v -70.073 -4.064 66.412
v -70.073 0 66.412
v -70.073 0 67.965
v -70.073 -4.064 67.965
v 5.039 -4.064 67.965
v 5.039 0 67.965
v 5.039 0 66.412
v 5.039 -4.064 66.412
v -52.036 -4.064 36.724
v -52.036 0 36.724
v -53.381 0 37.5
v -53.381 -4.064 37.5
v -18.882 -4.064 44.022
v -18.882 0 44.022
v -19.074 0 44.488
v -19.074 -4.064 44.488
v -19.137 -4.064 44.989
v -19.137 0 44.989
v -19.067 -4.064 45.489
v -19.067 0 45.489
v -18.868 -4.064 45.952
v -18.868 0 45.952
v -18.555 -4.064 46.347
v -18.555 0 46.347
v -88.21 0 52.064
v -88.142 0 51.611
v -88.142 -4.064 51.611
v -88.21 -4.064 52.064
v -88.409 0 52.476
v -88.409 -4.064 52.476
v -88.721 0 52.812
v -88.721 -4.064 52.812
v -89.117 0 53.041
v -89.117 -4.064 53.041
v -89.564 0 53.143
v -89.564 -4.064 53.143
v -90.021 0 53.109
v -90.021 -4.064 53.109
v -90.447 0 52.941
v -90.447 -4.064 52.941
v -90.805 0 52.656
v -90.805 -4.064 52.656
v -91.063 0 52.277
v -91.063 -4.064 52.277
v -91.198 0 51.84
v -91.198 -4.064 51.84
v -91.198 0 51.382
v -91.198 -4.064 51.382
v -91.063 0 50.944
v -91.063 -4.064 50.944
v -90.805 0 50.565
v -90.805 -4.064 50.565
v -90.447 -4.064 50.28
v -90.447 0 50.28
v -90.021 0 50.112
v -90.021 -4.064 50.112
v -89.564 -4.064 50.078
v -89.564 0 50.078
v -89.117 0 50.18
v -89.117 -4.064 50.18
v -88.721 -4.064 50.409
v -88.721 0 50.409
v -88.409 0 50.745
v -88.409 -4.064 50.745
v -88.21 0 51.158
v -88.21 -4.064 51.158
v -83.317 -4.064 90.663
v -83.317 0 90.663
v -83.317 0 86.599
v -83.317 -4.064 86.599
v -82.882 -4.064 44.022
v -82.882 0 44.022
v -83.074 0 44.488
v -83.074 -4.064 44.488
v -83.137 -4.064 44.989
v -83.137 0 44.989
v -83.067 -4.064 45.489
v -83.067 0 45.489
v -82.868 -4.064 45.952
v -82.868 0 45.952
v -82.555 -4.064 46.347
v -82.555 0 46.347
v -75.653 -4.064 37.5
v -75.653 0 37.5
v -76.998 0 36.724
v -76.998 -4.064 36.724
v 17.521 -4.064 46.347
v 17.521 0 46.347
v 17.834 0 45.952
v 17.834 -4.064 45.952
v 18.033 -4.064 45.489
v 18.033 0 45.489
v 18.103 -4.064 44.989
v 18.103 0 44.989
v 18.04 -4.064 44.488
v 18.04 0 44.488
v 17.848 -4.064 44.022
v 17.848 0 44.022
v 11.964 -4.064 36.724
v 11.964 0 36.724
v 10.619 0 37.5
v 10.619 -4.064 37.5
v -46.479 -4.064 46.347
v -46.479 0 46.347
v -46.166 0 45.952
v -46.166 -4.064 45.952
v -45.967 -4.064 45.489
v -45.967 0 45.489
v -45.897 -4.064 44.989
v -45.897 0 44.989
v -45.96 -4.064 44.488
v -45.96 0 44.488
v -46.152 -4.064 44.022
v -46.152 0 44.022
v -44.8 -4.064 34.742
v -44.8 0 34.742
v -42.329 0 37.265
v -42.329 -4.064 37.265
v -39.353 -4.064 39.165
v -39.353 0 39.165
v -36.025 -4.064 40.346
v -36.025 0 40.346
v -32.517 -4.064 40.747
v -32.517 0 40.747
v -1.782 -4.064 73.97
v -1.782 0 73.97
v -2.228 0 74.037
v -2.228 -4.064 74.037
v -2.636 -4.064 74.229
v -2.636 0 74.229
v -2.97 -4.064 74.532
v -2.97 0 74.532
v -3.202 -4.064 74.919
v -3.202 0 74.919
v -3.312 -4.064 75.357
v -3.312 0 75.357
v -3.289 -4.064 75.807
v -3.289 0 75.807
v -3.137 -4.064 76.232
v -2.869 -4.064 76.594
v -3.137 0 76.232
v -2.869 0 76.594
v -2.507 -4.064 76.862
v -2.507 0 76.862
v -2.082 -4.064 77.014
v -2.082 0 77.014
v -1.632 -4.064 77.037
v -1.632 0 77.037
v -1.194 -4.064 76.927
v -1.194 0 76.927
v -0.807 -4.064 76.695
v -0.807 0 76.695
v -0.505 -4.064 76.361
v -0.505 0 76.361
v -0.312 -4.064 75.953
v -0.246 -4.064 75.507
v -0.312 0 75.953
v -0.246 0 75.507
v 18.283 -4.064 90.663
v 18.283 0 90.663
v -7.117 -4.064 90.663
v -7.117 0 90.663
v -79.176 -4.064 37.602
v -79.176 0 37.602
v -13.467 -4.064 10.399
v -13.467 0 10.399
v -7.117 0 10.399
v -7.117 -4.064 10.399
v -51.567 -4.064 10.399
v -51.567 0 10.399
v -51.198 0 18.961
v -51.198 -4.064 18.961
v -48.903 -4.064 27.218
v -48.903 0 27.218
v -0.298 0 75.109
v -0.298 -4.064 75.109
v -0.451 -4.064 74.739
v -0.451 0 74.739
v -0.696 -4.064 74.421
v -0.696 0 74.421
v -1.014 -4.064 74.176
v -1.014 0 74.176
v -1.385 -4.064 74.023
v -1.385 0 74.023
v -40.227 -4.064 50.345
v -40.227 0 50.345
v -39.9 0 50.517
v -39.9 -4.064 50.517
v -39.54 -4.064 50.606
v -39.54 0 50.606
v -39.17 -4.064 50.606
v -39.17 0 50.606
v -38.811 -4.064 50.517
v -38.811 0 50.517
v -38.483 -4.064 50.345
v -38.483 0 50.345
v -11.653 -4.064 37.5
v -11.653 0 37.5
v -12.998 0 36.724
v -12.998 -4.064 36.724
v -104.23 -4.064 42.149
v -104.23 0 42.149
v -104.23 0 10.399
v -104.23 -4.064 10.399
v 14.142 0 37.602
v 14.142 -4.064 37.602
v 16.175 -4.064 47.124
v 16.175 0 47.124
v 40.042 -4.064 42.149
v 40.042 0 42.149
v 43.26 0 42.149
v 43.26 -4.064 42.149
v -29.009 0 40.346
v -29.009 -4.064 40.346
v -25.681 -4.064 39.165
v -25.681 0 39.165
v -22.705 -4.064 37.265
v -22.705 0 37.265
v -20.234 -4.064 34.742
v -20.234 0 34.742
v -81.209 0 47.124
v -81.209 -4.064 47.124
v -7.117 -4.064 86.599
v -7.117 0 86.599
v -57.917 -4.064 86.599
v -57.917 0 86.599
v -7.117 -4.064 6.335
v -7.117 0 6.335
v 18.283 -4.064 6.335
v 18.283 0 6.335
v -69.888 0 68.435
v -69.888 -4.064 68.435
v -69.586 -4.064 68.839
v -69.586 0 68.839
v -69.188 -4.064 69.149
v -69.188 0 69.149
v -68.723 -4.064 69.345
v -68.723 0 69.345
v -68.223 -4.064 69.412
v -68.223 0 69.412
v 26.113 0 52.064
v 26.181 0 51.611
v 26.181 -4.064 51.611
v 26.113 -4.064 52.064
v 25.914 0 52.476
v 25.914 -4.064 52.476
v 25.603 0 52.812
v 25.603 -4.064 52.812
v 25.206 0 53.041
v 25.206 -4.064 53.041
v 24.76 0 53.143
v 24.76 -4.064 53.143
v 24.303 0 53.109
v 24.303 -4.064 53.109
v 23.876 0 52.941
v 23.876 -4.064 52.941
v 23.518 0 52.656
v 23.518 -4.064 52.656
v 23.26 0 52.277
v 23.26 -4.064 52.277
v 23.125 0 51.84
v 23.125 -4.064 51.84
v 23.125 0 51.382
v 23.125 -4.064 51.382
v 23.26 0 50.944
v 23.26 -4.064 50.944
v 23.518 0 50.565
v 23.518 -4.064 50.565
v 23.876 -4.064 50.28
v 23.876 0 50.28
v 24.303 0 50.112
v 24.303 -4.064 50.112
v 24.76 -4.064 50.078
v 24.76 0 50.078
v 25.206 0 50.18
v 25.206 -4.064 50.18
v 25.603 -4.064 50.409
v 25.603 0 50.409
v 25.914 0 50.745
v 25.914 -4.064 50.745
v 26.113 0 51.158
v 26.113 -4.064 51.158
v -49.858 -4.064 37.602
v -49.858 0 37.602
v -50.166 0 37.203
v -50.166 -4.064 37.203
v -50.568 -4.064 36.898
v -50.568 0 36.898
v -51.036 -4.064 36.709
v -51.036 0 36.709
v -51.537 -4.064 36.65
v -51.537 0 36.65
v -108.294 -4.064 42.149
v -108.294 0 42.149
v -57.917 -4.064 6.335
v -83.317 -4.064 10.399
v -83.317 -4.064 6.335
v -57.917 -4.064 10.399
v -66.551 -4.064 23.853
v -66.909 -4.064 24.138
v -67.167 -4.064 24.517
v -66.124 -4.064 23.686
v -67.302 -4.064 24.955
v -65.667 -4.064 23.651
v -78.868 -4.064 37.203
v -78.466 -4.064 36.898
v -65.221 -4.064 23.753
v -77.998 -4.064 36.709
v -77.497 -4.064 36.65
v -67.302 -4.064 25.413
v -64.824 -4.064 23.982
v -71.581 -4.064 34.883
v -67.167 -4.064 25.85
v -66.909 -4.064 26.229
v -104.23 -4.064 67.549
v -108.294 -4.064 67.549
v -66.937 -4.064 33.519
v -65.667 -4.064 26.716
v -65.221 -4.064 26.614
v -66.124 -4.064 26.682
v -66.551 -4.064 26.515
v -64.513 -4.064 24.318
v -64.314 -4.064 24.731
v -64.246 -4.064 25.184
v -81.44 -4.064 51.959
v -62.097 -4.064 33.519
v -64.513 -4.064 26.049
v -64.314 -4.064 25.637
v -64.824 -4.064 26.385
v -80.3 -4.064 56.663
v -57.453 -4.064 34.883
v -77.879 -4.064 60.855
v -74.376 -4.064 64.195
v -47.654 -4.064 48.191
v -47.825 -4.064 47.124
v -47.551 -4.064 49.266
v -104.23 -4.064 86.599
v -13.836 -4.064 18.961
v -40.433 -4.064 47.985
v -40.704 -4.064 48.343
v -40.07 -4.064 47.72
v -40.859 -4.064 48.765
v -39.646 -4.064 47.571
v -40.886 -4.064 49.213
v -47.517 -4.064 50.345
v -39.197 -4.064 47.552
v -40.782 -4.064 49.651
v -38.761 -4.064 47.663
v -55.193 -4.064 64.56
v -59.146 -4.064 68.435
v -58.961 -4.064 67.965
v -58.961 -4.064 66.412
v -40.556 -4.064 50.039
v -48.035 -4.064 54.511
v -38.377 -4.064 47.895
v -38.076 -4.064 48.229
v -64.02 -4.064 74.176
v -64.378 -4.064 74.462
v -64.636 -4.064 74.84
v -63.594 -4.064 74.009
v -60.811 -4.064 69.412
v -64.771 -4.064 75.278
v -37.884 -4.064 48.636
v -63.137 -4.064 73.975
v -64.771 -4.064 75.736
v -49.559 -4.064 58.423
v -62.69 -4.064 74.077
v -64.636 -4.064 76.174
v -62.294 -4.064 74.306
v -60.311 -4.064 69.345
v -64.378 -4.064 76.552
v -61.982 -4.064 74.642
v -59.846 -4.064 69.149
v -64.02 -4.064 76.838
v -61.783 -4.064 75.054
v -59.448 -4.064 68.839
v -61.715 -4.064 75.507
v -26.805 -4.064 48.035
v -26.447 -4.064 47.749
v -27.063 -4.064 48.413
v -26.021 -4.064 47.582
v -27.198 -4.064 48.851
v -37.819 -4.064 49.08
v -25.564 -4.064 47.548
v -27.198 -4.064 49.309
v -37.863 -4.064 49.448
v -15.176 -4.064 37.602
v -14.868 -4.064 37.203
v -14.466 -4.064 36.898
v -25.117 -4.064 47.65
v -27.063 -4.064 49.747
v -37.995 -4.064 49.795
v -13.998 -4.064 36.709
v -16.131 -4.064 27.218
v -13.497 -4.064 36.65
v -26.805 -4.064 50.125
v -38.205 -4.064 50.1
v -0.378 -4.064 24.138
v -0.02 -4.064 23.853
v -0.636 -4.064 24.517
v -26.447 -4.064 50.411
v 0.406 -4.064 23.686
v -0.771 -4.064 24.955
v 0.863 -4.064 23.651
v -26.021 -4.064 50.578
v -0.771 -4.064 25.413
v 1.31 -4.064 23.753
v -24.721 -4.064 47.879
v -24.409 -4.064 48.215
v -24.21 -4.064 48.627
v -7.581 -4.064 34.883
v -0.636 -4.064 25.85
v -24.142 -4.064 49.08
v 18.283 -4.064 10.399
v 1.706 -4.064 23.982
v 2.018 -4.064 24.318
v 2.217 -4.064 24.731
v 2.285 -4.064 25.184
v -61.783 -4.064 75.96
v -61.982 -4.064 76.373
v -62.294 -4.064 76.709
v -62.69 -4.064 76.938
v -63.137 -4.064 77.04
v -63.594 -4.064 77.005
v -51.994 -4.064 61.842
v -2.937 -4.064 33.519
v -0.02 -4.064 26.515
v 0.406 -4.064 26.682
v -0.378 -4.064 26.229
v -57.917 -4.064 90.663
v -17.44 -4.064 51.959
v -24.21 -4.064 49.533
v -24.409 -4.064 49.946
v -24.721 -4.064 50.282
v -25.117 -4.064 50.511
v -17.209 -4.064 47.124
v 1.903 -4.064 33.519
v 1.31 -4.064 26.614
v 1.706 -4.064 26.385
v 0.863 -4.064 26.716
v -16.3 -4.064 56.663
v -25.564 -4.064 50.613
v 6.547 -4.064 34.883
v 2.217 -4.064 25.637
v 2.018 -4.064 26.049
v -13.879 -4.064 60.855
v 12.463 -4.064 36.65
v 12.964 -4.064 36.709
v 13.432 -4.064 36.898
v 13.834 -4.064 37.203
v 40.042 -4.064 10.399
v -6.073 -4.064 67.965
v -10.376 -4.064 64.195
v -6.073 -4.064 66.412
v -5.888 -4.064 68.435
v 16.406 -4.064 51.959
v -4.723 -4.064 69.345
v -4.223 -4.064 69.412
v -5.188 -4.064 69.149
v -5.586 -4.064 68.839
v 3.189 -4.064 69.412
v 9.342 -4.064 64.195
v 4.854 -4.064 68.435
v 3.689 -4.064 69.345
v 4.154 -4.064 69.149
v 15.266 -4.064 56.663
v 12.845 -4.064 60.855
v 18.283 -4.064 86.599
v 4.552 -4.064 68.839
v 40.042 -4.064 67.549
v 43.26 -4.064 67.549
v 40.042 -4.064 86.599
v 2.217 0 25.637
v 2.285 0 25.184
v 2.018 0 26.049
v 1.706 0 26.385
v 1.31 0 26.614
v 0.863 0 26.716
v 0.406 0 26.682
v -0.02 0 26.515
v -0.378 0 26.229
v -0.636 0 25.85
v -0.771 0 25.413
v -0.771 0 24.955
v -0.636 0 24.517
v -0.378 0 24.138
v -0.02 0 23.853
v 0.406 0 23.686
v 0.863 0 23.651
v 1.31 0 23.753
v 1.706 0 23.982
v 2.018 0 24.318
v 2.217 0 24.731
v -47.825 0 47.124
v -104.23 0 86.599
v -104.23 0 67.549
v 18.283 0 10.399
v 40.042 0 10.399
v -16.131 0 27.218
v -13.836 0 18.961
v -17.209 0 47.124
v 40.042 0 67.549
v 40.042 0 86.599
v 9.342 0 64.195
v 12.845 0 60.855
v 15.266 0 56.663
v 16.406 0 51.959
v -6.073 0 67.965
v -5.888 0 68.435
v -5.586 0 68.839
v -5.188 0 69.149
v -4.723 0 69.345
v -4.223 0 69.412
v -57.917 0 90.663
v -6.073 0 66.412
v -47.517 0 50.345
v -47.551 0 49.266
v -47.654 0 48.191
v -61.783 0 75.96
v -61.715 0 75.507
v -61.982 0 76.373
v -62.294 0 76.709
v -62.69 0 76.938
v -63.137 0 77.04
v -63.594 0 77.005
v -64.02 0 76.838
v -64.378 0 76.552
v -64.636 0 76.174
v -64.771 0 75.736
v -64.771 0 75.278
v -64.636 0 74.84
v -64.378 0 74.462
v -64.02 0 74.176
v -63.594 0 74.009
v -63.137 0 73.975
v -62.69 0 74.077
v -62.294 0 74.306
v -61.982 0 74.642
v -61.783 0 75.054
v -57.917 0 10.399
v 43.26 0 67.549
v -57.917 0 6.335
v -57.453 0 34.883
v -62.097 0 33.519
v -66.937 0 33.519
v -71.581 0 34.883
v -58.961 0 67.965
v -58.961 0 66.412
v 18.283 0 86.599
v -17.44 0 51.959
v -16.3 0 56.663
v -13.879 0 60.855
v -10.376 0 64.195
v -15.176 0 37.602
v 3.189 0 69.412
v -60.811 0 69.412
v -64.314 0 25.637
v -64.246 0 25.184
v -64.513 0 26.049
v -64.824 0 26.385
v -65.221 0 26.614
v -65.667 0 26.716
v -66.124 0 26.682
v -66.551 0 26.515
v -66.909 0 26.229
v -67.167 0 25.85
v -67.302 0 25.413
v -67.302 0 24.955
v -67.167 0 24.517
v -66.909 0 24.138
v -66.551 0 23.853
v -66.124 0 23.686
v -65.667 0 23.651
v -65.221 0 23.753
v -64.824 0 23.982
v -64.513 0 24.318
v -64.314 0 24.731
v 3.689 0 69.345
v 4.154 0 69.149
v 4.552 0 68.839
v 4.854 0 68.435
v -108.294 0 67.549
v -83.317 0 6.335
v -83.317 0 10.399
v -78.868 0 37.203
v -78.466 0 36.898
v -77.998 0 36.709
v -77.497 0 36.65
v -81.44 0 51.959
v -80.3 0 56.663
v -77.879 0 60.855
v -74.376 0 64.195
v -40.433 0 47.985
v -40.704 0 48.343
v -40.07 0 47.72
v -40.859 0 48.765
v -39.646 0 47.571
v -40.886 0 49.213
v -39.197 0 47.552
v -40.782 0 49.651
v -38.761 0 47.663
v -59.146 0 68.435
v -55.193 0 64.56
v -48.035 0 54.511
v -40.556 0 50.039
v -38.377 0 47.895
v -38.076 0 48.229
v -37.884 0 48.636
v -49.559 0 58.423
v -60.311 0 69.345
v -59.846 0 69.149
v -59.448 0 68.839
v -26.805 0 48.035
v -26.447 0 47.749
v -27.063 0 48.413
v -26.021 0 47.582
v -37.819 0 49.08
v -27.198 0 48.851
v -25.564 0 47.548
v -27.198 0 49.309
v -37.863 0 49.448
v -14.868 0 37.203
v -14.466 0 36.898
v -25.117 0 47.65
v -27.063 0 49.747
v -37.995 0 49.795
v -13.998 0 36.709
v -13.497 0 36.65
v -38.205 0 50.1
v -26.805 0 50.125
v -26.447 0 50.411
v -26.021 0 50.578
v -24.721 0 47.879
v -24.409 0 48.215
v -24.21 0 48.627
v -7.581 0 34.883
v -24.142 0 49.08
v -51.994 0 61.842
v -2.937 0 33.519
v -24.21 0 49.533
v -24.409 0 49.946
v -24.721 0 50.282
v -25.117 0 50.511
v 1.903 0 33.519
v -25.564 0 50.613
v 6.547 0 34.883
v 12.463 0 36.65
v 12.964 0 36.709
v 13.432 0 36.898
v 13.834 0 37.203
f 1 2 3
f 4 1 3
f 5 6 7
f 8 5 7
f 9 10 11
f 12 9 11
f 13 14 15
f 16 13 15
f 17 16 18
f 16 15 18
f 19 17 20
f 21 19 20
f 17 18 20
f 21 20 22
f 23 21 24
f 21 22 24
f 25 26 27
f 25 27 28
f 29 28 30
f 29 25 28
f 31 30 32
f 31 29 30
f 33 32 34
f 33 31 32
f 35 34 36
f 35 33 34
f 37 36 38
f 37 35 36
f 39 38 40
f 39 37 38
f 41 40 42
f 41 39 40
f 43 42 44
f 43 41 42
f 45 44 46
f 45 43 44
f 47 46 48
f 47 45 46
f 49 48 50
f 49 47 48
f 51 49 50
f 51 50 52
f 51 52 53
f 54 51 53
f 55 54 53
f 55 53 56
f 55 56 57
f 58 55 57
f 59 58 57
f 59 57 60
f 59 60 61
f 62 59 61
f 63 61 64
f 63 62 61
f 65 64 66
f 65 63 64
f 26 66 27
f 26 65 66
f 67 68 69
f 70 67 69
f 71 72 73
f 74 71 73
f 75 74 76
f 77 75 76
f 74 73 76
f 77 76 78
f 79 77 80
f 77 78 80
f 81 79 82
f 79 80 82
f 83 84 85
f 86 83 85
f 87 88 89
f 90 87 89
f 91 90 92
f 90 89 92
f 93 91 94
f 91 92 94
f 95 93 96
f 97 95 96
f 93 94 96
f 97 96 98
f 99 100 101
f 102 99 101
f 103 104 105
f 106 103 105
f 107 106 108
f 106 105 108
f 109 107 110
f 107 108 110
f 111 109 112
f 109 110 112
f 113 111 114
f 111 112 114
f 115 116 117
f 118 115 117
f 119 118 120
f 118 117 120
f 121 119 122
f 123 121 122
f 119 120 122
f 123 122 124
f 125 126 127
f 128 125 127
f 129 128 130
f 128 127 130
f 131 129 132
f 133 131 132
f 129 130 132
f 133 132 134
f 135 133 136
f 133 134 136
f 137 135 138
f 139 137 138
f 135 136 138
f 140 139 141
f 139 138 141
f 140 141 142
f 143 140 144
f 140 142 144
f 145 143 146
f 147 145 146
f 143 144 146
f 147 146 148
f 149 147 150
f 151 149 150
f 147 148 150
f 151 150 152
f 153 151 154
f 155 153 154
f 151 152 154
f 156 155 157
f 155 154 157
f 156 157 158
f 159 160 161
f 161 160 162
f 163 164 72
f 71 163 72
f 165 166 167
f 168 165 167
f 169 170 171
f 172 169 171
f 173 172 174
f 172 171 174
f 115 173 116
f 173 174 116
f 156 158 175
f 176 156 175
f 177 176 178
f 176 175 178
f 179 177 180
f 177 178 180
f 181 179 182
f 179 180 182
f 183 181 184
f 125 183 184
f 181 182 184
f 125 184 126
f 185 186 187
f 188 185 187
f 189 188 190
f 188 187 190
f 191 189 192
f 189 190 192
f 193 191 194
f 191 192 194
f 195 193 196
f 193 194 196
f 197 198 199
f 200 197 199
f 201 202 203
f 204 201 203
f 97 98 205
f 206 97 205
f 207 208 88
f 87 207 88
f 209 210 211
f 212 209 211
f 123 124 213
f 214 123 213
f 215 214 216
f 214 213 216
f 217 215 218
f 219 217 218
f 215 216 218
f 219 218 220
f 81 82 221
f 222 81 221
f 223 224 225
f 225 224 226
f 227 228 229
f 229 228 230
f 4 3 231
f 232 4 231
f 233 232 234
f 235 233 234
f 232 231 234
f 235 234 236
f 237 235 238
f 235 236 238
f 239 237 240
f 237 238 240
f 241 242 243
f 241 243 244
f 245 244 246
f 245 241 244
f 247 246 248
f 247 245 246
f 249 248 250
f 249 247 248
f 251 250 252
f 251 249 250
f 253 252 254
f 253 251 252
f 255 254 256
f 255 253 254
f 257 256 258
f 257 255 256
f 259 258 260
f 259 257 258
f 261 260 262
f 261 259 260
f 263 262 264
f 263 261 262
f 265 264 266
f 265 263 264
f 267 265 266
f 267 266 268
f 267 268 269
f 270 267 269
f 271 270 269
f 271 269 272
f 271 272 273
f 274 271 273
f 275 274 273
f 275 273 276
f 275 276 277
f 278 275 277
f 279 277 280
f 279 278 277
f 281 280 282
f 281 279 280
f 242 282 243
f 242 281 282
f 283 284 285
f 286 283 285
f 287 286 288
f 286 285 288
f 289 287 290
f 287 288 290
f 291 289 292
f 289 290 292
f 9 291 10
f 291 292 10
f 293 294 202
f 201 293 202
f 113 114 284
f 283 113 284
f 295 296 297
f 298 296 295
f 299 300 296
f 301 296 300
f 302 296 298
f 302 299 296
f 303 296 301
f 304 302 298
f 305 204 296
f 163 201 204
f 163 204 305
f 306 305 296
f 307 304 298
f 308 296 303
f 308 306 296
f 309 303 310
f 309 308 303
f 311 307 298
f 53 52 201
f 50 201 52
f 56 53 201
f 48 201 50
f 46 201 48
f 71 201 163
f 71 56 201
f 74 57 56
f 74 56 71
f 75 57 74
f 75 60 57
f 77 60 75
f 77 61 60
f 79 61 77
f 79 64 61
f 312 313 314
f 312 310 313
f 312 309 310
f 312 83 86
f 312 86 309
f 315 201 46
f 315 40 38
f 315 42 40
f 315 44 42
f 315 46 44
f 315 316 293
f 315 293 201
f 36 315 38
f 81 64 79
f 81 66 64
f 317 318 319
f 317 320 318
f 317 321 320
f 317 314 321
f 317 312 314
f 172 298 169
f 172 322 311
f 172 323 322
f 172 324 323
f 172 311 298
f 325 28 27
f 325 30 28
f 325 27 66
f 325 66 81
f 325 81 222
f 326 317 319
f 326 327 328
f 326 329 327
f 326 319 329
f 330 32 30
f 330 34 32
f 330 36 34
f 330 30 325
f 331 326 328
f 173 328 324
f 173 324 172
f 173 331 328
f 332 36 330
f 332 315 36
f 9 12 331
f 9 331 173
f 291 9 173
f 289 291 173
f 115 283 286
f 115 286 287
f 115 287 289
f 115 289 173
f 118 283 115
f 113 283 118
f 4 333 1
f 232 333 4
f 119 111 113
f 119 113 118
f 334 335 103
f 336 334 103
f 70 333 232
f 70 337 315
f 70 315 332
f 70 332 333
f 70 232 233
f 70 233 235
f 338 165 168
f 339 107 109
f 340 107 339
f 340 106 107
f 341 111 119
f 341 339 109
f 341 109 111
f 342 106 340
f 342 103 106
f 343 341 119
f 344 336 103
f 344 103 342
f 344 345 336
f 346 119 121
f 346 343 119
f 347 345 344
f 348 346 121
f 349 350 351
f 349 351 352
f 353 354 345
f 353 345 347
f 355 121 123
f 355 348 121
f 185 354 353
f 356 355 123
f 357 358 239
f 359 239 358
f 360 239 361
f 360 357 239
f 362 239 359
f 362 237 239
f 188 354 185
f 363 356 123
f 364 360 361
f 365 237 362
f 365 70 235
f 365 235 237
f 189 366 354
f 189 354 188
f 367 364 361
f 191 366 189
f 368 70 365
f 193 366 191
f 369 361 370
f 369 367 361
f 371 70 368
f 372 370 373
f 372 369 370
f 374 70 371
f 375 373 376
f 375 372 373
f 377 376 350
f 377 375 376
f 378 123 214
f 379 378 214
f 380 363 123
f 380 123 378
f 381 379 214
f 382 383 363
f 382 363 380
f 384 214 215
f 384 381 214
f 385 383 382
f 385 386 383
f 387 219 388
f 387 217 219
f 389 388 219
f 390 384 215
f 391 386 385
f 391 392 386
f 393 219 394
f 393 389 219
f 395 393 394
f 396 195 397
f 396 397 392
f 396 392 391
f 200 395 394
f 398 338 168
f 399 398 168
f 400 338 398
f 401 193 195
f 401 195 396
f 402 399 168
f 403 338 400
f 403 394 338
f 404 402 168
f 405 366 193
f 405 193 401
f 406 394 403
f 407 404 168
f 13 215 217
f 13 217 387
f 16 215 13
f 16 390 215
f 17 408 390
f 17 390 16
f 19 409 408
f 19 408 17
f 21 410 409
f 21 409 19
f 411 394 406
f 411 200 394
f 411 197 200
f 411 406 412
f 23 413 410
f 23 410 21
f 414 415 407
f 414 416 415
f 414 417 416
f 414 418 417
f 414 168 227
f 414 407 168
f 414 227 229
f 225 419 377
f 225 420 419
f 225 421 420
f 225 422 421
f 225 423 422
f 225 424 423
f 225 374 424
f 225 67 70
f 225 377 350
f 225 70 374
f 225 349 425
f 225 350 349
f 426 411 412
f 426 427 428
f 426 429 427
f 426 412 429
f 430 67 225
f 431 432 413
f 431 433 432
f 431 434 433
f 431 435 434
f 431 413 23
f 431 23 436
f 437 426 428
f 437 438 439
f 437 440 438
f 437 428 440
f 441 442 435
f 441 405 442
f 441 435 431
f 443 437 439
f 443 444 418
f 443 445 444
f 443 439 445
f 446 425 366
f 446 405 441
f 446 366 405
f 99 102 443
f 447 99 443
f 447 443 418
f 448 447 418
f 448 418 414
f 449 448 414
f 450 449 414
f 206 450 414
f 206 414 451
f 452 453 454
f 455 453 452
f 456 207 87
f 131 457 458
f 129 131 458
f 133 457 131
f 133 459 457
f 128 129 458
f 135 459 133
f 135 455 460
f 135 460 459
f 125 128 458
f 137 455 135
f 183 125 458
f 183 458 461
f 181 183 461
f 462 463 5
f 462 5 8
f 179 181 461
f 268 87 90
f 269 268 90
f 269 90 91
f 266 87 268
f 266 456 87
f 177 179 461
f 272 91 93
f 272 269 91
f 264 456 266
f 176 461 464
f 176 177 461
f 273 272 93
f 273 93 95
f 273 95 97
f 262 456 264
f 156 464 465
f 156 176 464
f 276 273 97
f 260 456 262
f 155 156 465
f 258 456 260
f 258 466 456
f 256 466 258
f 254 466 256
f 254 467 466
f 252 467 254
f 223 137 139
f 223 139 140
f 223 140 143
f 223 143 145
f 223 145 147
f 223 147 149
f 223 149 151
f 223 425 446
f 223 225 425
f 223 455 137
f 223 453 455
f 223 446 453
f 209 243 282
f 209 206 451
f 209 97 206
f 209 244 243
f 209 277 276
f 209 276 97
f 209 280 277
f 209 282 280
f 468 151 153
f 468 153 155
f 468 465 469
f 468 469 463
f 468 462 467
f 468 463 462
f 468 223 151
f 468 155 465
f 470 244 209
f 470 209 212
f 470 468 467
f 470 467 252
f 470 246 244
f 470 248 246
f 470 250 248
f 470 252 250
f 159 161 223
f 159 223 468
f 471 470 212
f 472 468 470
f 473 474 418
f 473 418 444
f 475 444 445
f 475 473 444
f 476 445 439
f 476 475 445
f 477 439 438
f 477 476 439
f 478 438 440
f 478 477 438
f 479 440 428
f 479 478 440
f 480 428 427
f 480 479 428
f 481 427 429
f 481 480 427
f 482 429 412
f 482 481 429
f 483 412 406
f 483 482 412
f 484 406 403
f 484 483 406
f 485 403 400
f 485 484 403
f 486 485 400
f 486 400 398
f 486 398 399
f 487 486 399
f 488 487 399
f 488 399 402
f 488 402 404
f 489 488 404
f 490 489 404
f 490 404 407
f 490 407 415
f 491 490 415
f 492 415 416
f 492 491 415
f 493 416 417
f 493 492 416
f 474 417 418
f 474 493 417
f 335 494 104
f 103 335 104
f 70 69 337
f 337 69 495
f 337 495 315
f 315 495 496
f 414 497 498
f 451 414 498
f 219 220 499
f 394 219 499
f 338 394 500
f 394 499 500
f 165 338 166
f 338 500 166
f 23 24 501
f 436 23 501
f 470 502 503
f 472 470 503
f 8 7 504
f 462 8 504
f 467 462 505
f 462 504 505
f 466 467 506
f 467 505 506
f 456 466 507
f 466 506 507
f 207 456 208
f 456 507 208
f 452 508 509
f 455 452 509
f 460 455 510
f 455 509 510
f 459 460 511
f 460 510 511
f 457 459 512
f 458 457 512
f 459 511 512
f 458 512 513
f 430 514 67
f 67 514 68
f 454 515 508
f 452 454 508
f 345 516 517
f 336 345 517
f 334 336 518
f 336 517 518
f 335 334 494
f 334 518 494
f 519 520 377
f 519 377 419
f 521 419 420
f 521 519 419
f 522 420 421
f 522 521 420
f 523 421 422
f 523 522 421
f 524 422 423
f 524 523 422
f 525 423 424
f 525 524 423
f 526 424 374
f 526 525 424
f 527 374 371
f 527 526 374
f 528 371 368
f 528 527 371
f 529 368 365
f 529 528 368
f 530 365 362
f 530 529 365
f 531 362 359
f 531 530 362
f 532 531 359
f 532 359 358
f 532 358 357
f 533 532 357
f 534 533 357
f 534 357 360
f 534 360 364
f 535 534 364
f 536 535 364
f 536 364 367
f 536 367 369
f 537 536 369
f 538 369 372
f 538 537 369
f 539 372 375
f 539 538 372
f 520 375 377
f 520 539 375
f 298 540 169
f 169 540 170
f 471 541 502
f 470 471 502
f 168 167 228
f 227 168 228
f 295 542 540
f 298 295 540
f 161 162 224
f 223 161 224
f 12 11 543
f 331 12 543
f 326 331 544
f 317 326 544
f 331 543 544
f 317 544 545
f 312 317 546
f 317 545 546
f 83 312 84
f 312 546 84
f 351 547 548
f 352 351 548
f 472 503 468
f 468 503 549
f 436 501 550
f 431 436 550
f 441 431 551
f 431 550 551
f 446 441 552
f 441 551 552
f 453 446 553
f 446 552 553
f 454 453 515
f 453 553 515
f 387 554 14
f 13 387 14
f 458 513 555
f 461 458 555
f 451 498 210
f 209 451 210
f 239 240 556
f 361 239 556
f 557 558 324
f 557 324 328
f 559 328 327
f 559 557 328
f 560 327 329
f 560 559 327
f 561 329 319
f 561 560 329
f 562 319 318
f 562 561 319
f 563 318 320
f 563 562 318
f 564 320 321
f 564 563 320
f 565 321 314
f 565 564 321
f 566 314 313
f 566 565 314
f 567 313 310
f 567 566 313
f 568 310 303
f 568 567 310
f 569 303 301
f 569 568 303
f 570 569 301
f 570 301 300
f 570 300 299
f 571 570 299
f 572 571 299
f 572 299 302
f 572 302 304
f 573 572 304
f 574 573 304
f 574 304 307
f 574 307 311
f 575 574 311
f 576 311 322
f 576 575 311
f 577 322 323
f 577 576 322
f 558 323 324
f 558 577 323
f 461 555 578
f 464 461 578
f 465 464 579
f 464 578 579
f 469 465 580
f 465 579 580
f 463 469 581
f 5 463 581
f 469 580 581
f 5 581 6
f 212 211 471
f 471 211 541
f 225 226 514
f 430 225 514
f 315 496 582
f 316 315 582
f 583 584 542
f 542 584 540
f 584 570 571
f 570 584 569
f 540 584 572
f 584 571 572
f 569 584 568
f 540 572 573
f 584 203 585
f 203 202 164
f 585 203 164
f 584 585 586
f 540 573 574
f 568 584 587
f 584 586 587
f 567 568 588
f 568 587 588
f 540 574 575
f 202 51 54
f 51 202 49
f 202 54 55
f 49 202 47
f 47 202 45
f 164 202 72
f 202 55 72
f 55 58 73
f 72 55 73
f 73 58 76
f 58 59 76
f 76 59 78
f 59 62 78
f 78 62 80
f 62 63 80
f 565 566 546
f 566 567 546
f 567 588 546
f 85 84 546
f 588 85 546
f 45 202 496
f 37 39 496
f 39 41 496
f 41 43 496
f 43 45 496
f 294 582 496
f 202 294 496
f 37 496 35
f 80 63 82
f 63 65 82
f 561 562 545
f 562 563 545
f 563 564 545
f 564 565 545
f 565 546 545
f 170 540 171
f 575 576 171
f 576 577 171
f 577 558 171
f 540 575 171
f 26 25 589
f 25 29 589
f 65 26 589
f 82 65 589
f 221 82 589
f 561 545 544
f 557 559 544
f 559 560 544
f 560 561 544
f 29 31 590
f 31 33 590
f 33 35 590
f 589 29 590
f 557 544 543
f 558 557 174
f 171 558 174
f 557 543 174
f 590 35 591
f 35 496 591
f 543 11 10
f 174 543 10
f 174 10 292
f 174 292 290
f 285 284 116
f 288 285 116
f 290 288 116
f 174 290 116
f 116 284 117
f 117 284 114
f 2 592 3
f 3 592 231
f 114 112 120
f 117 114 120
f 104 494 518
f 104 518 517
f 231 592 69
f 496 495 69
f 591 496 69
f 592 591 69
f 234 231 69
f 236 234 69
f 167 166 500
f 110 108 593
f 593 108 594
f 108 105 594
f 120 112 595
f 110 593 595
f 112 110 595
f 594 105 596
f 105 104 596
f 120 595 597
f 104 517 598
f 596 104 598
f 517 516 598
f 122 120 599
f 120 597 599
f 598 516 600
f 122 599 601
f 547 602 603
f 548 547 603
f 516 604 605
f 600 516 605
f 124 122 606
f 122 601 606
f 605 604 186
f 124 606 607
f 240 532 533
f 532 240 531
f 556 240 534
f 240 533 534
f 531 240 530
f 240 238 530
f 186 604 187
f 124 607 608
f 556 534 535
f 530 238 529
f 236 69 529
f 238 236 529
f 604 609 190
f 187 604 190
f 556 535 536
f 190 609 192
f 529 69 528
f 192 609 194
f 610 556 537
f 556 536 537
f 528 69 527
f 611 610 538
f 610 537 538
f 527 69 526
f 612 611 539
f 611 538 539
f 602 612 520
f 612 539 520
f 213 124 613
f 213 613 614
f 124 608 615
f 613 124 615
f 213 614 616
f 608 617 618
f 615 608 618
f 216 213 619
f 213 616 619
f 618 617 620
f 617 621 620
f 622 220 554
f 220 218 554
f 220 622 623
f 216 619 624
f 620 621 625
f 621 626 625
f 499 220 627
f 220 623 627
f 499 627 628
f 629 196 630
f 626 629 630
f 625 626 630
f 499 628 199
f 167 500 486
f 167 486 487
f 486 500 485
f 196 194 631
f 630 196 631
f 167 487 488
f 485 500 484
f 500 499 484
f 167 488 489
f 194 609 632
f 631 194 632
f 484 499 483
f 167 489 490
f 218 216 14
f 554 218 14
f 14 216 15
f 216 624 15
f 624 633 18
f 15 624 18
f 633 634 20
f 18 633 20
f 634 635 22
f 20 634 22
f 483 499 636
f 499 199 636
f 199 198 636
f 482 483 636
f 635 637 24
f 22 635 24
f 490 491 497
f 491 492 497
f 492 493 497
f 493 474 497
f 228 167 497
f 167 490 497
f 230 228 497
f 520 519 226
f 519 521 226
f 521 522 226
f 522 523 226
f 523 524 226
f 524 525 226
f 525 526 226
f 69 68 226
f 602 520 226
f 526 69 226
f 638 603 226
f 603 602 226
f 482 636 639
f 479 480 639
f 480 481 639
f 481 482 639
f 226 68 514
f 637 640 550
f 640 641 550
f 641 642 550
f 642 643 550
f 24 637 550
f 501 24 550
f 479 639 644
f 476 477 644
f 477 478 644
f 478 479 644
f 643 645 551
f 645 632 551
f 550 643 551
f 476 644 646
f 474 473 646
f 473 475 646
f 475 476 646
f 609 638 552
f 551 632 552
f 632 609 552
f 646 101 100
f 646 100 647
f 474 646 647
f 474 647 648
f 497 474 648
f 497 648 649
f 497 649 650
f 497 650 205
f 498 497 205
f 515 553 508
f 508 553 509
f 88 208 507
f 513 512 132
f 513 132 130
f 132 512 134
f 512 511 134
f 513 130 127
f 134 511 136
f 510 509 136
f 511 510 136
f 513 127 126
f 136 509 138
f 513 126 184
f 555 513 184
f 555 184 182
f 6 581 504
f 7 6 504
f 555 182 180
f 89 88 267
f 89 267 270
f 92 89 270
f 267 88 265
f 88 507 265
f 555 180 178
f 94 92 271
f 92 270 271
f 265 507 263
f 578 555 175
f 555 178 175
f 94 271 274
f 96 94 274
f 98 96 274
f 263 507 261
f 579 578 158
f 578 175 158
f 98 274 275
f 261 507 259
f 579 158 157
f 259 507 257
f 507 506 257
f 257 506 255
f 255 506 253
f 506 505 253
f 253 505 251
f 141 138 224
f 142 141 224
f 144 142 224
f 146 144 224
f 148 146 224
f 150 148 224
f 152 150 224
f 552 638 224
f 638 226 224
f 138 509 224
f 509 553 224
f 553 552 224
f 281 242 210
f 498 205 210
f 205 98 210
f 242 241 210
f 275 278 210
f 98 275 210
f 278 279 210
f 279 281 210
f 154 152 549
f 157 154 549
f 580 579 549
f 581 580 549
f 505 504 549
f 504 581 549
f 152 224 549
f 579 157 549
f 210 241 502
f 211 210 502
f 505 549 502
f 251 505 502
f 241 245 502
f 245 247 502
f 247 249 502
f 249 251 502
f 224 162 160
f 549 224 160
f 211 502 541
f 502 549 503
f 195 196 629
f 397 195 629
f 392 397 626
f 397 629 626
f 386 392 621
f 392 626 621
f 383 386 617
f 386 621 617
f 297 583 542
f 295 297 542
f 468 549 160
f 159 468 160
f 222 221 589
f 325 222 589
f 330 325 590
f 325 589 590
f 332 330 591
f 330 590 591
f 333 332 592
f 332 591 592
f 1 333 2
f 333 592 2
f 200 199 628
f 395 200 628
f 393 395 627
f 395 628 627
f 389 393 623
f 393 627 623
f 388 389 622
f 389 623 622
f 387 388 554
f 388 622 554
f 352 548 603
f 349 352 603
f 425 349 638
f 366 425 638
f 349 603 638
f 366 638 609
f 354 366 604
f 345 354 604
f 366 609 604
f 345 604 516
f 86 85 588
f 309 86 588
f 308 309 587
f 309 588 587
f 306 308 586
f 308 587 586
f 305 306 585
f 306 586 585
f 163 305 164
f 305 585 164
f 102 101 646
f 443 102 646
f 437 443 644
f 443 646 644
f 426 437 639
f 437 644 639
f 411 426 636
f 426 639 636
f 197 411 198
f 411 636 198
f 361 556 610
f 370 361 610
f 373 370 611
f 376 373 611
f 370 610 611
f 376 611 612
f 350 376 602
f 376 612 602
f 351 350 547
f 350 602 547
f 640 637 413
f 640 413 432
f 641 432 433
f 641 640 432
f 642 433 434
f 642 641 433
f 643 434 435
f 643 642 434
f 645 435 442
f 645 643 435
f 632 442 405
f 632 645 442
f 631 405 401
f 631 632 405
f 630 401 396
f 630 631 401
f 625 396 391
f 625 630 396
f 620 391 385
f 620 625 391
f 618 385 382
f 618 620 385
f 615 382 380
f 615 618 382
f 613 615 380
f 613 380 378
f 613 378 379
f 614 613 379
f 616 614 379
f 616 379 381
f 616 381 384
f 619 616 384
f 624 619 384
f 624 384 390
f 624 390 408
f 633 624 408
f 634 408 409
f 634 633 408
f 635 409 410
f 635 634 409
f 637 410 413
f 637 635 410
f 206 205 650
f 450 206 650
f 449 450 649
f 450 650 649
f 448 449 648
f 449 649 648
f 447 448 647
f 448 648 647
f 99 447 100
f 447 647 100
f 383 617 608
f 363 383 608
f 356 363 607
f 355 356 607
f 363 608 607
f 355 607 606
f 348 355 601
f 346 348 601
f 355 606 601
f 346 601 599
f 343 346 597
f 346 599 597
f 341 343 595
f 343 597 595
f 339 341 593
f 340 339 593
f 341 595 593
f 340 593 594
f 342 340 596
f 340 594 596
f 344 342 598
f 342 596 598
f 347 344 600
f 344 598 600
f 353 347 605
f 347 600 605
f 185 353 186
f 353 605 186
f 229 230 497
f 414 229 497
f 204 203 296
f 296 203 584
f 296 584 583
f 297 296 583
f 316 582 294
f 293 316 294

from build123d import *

# Parameters (mm, degrees)
F0_R     = 1.5367
F1_DEPTH = 4.064


with BuildPart() as f1:
    # F0 (on Front) → F1 (new body)
    with BuildSketch(Plane.XZ):
        with BuildLine():
            Line((-104.230369, 34.021411), (-104.230369, 10.399411))
            Line((-104.230369, 10.399411), (-83.317001, 10.399411))
            Line((-83.317001, 10.399411), (-83.317001, 6.335411))
            Line((-83.317001, 6.335411), (-57.917001, 6.335411))
            Line((-57.917001, 6.335411), (-57.917001, 10.399411))
            Line((-57.917001, 10.399411), (-51.567001, 10.399411))
            ThreePointArc((-51.567001, 10.399411), (-50.286289, 23.155259), (-44.800168, 34.742078))
            ThreePointArc((-44.800168, 34.742078), (-39.353114, 39.16509), (-32.517001, 40.746542))
            Line((-32.517001, 40.746542), (-32.517001, 50.34544))
            Line((-32.517001, 50.34544), (-32.517001, 86.599411))
            Line((-32.517001, 86.599411), (-57.917001, 86.599411))
            Line((-57.917001, 86.599411), (-57.917001, 90.663411))
            Line((-57.917001, 90.663411), (-83.317001, 90.663411))
            Line((-83.317001, 90.663411), (-83.317001, 86.599411))
            Line((-83.317001, 86.599411), (-104.230369, 86.599411))
            Line((-104.230369, 86.599411), (-104.230369, 67.549411))
            Line((-104.230369, 67.549411), (-108.294369, 67.549411))
            Line((-108.294369, 67.549411), (-108.294369, 64.219405))
            Line((-108.294369, 64.219405), (-108.294369, 42.149411))
            Line((-108.294369, 42.149411), (-104.230369, 42.149411))
            Line((-104.230369, 42.149411), (-104.230369, 34.021411))
        make_face()
        with Locations((-65.78223, 25.183681)):
            Circle(F0_R, mode=Mode.SUBTRACT)
        with Locations((-89.67876, 51.61067)):
            Circle(F0_R, mode=Mode.SUBTRACT)
        with BuildLine():
            ThreePointArc((-58.96075, 66.41181), (-50.670405, 60.208094), (-47.516996, 50.34544))
            ThreePointArc((-47.516996, 50.34544), (-47.59417, 48.72743), (-47.824991, 47.124109))
            Line((-47.824991, 47.124109), (-46.479494, 46.347286))
            ThreePointArc((-46.479494, 46.347286), (-45.915131, 45.241108), (-46.151868, 44.022055))
            Line((-46.151868, 44.022055), (-49.858222, 37.602462))
            ThreePointArc((-49.858222, 37.602462), (-50.795585, 36.787915), (-52.035744, 36.723579))
            Line((-52.035744, 36.723579), (-53.381241, 37.500402))
            ThreePointArc((-53.381241, 37.500402), (-64.517, 33.345436), (-75.652759, 37.500402))
            Line((-75.652759, 37.500402), (-76.998257, 36.723579))
            ThreePointArc((-76.998257, 36.723579), (-78.238416, 36.787915), (-79.175778, 37.602462))
            Line((-79.175778, 37.602462), (-82.882132, 44.022055))
            ThreePointArc((-82.882132, 44.022055), (-83.118869, 45.241108), (-82.554507, 46.347286))
            Line((-82.554507, 46.347286), (-81.209009, 47.124109))
            ThreePointArc((-81.209009, 47.124109), (-79.239436, 58.845442), (-70.07325, 66.41181))
            Line((-70.07325, 66.41181), (-70.07325, 67.965456))
            ThreePointArc((-70.07325, 67.965456), (-69.397453, 69.007298), (-68.223354, 69.411804))
            Line((-68.223354, 69.411804), (-60.810646, 69.411804))
            ThreePointArc((-60.810646, 69.411804), (-59.636547, 69.007298), (-58.96075, 67.965456))
            Line((-58.96075, 67.965456), (-58.96075, 66.41181))
        make_face(mode=Mode.SUBTRACT)
        with BuildLine():
            ThreePointArc((-40.227387, 50.34544), (-39.35524, 50.61691), (-38.483094, 50.34544))
            ThreePointArc((-38.483094, 50.34544), (-37.994786, 49.79478), (-37.81854, 49.08021))
            ThreePointArc((-37.81854, 49.08021), (-40.06981, 47.719756), (-40.227387, 50.34544))
        make_face(mode=Mode.SUBTRACT)
        with Locations((-63.25177, 75.5072)):
            Circle(F0_R, mode=Mode.SUBTRACT)
        with BuildLine():
            Line((-32.517001, 50.34544), (-32.517001, 40.746542))
            ThreePointArc((-32.517001, 40.746542), (-25.680887, 39.16509), (-20.233833, 34.742078))
            ThreePointArc((-20.233833, 34.742078), (-14.747713, 23.155259), (-13.467001, 10.399411))
            Line((-13.467001, 10.399411), (-13.044369, 10.399411))
            Line((-13.044369, 10.399411), (-7.117001, 10.399411))
            Line((-7.117001, 10.399411), (-7.117001, 6.335411))
            Line((-7.117001, 6.335411), (18.282999, 6.335411))
            Line((18.282999, 6.335411), (18.282999, 10.399411))
            Line((18.282999, 10.399411), (40.041631, 10.399411))
            Line((40.041631, 10.399411), (40.041631, 34.021411))
            Line((40.041631, 34.021411), (40.041631, 42.149411))
            Line((40.041631, 42.149411), (43.260368, 42.149411))
            Line((43.260368, 42.149411), (43.260368, 67.549411))
            Line((43.260368, 67.549411), (40.041631, 67.549411))
            Line((40.041631, 67.549411), (40.041631, 86.599411))
            Line((40.041631, 86.599411), (18.282999, 86.599411))
            Line((18.282999, 86.599411), (18.282999, 90.663411))
            Line((18.282999, 90.663411), (-7.117001, 90.663411))
            Line((-7.117001, 90.663411), (-7.117001, 86.599411))
            Line((-7.117001, 86.599411), (-32.517001, 86.599411))
            Line((-32.517001, 86.599411), (-32.517001, 50.34544))
        make_face()
        with Locations((0.748229, 25.183681)):
            Circle(F0_R, mode=Mode.SUBTRACT)
        with Locations((-25.678761, 49.08021)):
            Circle(F0_R, mode=Mode.SUBTRACT)
        with BuildLine():
            Line((5.039249, 67.965456), (5.039249, 66.41181))
            ThreePointArc((5.039249, 66.41181), (14.205434, 58.845442), (16.175008, 47.124109))
            Line((16.175008, 47.124109), (17.520505, 46.347286))
            ThreePointArc((17.520505, 46.347286), (18.084868, 45.241108), (17.848131, 44.022055))
            Line((17.848131, 44.022055), (14.141777, 37.602462))
            ThreePointArc((14.141777, 37.602462), (13.204414, 36.787915), (11.964255, 36.723579))
            Line((11.964255, 36.723579), (10.618758, 37.500402))
            ThreePointArc((10.618758, 37.500402), (-0.517001, 33.345436), (-11.65276, 37.500402))
            Line((-11.65276, 37.500402), (-12.998258, 36.723579))
            ThreePointArc((-12.998258, 36.723579), (-14.238417, 36.787915), (-15.175779, 37.602462))
            Line((-15.175779, 37.602462), (-18.882133, 44.022055))
            ThreePointArc((-18.882133, 44.022055), (-19.11887, 45.241108), (-18.554508, 46.347286))
            Line((-18.554508, 46.347286), (-17.20901, 47.124109))
            ThreePointArc((-17.20901, 47.124109), (-15.239437, 58.845442), (-6.073251, 66.41181))
            Line((-6.073251, 66.41181), (-6.073251, 67.965456))
            ThreePointArc((-6.073251, 67.965456), (-5.397454, 69.007298), (-4.223355, 69.411804))
            Line((-4.223355, 69.411804), (3.189353, 69.411804))
            ThreePointArc((3.189353, 69.411804), (4.363452, 69.007298), (5.039249, 67.965456))
        make_face(mode=Mode.SUBTRACT)
        with Locations((24.644759, 51.61067)):
            Circle(F0_R, mode=Mode.SUBTRACT)
        with BuildLine():
            ThreePointArc((-1.782231, 73.9705), (-2.868842, 76.593811), (-0.245531, 75.5072))
            ThreePointArc((-0.245531, 75.5072), (-0.69562, 74.420589), (-1.782231, 73.9705))
        make_face(mode=Mode.SUBTRACT)
    extrude(amount=F1_DEPTH)


solid = f1.part
